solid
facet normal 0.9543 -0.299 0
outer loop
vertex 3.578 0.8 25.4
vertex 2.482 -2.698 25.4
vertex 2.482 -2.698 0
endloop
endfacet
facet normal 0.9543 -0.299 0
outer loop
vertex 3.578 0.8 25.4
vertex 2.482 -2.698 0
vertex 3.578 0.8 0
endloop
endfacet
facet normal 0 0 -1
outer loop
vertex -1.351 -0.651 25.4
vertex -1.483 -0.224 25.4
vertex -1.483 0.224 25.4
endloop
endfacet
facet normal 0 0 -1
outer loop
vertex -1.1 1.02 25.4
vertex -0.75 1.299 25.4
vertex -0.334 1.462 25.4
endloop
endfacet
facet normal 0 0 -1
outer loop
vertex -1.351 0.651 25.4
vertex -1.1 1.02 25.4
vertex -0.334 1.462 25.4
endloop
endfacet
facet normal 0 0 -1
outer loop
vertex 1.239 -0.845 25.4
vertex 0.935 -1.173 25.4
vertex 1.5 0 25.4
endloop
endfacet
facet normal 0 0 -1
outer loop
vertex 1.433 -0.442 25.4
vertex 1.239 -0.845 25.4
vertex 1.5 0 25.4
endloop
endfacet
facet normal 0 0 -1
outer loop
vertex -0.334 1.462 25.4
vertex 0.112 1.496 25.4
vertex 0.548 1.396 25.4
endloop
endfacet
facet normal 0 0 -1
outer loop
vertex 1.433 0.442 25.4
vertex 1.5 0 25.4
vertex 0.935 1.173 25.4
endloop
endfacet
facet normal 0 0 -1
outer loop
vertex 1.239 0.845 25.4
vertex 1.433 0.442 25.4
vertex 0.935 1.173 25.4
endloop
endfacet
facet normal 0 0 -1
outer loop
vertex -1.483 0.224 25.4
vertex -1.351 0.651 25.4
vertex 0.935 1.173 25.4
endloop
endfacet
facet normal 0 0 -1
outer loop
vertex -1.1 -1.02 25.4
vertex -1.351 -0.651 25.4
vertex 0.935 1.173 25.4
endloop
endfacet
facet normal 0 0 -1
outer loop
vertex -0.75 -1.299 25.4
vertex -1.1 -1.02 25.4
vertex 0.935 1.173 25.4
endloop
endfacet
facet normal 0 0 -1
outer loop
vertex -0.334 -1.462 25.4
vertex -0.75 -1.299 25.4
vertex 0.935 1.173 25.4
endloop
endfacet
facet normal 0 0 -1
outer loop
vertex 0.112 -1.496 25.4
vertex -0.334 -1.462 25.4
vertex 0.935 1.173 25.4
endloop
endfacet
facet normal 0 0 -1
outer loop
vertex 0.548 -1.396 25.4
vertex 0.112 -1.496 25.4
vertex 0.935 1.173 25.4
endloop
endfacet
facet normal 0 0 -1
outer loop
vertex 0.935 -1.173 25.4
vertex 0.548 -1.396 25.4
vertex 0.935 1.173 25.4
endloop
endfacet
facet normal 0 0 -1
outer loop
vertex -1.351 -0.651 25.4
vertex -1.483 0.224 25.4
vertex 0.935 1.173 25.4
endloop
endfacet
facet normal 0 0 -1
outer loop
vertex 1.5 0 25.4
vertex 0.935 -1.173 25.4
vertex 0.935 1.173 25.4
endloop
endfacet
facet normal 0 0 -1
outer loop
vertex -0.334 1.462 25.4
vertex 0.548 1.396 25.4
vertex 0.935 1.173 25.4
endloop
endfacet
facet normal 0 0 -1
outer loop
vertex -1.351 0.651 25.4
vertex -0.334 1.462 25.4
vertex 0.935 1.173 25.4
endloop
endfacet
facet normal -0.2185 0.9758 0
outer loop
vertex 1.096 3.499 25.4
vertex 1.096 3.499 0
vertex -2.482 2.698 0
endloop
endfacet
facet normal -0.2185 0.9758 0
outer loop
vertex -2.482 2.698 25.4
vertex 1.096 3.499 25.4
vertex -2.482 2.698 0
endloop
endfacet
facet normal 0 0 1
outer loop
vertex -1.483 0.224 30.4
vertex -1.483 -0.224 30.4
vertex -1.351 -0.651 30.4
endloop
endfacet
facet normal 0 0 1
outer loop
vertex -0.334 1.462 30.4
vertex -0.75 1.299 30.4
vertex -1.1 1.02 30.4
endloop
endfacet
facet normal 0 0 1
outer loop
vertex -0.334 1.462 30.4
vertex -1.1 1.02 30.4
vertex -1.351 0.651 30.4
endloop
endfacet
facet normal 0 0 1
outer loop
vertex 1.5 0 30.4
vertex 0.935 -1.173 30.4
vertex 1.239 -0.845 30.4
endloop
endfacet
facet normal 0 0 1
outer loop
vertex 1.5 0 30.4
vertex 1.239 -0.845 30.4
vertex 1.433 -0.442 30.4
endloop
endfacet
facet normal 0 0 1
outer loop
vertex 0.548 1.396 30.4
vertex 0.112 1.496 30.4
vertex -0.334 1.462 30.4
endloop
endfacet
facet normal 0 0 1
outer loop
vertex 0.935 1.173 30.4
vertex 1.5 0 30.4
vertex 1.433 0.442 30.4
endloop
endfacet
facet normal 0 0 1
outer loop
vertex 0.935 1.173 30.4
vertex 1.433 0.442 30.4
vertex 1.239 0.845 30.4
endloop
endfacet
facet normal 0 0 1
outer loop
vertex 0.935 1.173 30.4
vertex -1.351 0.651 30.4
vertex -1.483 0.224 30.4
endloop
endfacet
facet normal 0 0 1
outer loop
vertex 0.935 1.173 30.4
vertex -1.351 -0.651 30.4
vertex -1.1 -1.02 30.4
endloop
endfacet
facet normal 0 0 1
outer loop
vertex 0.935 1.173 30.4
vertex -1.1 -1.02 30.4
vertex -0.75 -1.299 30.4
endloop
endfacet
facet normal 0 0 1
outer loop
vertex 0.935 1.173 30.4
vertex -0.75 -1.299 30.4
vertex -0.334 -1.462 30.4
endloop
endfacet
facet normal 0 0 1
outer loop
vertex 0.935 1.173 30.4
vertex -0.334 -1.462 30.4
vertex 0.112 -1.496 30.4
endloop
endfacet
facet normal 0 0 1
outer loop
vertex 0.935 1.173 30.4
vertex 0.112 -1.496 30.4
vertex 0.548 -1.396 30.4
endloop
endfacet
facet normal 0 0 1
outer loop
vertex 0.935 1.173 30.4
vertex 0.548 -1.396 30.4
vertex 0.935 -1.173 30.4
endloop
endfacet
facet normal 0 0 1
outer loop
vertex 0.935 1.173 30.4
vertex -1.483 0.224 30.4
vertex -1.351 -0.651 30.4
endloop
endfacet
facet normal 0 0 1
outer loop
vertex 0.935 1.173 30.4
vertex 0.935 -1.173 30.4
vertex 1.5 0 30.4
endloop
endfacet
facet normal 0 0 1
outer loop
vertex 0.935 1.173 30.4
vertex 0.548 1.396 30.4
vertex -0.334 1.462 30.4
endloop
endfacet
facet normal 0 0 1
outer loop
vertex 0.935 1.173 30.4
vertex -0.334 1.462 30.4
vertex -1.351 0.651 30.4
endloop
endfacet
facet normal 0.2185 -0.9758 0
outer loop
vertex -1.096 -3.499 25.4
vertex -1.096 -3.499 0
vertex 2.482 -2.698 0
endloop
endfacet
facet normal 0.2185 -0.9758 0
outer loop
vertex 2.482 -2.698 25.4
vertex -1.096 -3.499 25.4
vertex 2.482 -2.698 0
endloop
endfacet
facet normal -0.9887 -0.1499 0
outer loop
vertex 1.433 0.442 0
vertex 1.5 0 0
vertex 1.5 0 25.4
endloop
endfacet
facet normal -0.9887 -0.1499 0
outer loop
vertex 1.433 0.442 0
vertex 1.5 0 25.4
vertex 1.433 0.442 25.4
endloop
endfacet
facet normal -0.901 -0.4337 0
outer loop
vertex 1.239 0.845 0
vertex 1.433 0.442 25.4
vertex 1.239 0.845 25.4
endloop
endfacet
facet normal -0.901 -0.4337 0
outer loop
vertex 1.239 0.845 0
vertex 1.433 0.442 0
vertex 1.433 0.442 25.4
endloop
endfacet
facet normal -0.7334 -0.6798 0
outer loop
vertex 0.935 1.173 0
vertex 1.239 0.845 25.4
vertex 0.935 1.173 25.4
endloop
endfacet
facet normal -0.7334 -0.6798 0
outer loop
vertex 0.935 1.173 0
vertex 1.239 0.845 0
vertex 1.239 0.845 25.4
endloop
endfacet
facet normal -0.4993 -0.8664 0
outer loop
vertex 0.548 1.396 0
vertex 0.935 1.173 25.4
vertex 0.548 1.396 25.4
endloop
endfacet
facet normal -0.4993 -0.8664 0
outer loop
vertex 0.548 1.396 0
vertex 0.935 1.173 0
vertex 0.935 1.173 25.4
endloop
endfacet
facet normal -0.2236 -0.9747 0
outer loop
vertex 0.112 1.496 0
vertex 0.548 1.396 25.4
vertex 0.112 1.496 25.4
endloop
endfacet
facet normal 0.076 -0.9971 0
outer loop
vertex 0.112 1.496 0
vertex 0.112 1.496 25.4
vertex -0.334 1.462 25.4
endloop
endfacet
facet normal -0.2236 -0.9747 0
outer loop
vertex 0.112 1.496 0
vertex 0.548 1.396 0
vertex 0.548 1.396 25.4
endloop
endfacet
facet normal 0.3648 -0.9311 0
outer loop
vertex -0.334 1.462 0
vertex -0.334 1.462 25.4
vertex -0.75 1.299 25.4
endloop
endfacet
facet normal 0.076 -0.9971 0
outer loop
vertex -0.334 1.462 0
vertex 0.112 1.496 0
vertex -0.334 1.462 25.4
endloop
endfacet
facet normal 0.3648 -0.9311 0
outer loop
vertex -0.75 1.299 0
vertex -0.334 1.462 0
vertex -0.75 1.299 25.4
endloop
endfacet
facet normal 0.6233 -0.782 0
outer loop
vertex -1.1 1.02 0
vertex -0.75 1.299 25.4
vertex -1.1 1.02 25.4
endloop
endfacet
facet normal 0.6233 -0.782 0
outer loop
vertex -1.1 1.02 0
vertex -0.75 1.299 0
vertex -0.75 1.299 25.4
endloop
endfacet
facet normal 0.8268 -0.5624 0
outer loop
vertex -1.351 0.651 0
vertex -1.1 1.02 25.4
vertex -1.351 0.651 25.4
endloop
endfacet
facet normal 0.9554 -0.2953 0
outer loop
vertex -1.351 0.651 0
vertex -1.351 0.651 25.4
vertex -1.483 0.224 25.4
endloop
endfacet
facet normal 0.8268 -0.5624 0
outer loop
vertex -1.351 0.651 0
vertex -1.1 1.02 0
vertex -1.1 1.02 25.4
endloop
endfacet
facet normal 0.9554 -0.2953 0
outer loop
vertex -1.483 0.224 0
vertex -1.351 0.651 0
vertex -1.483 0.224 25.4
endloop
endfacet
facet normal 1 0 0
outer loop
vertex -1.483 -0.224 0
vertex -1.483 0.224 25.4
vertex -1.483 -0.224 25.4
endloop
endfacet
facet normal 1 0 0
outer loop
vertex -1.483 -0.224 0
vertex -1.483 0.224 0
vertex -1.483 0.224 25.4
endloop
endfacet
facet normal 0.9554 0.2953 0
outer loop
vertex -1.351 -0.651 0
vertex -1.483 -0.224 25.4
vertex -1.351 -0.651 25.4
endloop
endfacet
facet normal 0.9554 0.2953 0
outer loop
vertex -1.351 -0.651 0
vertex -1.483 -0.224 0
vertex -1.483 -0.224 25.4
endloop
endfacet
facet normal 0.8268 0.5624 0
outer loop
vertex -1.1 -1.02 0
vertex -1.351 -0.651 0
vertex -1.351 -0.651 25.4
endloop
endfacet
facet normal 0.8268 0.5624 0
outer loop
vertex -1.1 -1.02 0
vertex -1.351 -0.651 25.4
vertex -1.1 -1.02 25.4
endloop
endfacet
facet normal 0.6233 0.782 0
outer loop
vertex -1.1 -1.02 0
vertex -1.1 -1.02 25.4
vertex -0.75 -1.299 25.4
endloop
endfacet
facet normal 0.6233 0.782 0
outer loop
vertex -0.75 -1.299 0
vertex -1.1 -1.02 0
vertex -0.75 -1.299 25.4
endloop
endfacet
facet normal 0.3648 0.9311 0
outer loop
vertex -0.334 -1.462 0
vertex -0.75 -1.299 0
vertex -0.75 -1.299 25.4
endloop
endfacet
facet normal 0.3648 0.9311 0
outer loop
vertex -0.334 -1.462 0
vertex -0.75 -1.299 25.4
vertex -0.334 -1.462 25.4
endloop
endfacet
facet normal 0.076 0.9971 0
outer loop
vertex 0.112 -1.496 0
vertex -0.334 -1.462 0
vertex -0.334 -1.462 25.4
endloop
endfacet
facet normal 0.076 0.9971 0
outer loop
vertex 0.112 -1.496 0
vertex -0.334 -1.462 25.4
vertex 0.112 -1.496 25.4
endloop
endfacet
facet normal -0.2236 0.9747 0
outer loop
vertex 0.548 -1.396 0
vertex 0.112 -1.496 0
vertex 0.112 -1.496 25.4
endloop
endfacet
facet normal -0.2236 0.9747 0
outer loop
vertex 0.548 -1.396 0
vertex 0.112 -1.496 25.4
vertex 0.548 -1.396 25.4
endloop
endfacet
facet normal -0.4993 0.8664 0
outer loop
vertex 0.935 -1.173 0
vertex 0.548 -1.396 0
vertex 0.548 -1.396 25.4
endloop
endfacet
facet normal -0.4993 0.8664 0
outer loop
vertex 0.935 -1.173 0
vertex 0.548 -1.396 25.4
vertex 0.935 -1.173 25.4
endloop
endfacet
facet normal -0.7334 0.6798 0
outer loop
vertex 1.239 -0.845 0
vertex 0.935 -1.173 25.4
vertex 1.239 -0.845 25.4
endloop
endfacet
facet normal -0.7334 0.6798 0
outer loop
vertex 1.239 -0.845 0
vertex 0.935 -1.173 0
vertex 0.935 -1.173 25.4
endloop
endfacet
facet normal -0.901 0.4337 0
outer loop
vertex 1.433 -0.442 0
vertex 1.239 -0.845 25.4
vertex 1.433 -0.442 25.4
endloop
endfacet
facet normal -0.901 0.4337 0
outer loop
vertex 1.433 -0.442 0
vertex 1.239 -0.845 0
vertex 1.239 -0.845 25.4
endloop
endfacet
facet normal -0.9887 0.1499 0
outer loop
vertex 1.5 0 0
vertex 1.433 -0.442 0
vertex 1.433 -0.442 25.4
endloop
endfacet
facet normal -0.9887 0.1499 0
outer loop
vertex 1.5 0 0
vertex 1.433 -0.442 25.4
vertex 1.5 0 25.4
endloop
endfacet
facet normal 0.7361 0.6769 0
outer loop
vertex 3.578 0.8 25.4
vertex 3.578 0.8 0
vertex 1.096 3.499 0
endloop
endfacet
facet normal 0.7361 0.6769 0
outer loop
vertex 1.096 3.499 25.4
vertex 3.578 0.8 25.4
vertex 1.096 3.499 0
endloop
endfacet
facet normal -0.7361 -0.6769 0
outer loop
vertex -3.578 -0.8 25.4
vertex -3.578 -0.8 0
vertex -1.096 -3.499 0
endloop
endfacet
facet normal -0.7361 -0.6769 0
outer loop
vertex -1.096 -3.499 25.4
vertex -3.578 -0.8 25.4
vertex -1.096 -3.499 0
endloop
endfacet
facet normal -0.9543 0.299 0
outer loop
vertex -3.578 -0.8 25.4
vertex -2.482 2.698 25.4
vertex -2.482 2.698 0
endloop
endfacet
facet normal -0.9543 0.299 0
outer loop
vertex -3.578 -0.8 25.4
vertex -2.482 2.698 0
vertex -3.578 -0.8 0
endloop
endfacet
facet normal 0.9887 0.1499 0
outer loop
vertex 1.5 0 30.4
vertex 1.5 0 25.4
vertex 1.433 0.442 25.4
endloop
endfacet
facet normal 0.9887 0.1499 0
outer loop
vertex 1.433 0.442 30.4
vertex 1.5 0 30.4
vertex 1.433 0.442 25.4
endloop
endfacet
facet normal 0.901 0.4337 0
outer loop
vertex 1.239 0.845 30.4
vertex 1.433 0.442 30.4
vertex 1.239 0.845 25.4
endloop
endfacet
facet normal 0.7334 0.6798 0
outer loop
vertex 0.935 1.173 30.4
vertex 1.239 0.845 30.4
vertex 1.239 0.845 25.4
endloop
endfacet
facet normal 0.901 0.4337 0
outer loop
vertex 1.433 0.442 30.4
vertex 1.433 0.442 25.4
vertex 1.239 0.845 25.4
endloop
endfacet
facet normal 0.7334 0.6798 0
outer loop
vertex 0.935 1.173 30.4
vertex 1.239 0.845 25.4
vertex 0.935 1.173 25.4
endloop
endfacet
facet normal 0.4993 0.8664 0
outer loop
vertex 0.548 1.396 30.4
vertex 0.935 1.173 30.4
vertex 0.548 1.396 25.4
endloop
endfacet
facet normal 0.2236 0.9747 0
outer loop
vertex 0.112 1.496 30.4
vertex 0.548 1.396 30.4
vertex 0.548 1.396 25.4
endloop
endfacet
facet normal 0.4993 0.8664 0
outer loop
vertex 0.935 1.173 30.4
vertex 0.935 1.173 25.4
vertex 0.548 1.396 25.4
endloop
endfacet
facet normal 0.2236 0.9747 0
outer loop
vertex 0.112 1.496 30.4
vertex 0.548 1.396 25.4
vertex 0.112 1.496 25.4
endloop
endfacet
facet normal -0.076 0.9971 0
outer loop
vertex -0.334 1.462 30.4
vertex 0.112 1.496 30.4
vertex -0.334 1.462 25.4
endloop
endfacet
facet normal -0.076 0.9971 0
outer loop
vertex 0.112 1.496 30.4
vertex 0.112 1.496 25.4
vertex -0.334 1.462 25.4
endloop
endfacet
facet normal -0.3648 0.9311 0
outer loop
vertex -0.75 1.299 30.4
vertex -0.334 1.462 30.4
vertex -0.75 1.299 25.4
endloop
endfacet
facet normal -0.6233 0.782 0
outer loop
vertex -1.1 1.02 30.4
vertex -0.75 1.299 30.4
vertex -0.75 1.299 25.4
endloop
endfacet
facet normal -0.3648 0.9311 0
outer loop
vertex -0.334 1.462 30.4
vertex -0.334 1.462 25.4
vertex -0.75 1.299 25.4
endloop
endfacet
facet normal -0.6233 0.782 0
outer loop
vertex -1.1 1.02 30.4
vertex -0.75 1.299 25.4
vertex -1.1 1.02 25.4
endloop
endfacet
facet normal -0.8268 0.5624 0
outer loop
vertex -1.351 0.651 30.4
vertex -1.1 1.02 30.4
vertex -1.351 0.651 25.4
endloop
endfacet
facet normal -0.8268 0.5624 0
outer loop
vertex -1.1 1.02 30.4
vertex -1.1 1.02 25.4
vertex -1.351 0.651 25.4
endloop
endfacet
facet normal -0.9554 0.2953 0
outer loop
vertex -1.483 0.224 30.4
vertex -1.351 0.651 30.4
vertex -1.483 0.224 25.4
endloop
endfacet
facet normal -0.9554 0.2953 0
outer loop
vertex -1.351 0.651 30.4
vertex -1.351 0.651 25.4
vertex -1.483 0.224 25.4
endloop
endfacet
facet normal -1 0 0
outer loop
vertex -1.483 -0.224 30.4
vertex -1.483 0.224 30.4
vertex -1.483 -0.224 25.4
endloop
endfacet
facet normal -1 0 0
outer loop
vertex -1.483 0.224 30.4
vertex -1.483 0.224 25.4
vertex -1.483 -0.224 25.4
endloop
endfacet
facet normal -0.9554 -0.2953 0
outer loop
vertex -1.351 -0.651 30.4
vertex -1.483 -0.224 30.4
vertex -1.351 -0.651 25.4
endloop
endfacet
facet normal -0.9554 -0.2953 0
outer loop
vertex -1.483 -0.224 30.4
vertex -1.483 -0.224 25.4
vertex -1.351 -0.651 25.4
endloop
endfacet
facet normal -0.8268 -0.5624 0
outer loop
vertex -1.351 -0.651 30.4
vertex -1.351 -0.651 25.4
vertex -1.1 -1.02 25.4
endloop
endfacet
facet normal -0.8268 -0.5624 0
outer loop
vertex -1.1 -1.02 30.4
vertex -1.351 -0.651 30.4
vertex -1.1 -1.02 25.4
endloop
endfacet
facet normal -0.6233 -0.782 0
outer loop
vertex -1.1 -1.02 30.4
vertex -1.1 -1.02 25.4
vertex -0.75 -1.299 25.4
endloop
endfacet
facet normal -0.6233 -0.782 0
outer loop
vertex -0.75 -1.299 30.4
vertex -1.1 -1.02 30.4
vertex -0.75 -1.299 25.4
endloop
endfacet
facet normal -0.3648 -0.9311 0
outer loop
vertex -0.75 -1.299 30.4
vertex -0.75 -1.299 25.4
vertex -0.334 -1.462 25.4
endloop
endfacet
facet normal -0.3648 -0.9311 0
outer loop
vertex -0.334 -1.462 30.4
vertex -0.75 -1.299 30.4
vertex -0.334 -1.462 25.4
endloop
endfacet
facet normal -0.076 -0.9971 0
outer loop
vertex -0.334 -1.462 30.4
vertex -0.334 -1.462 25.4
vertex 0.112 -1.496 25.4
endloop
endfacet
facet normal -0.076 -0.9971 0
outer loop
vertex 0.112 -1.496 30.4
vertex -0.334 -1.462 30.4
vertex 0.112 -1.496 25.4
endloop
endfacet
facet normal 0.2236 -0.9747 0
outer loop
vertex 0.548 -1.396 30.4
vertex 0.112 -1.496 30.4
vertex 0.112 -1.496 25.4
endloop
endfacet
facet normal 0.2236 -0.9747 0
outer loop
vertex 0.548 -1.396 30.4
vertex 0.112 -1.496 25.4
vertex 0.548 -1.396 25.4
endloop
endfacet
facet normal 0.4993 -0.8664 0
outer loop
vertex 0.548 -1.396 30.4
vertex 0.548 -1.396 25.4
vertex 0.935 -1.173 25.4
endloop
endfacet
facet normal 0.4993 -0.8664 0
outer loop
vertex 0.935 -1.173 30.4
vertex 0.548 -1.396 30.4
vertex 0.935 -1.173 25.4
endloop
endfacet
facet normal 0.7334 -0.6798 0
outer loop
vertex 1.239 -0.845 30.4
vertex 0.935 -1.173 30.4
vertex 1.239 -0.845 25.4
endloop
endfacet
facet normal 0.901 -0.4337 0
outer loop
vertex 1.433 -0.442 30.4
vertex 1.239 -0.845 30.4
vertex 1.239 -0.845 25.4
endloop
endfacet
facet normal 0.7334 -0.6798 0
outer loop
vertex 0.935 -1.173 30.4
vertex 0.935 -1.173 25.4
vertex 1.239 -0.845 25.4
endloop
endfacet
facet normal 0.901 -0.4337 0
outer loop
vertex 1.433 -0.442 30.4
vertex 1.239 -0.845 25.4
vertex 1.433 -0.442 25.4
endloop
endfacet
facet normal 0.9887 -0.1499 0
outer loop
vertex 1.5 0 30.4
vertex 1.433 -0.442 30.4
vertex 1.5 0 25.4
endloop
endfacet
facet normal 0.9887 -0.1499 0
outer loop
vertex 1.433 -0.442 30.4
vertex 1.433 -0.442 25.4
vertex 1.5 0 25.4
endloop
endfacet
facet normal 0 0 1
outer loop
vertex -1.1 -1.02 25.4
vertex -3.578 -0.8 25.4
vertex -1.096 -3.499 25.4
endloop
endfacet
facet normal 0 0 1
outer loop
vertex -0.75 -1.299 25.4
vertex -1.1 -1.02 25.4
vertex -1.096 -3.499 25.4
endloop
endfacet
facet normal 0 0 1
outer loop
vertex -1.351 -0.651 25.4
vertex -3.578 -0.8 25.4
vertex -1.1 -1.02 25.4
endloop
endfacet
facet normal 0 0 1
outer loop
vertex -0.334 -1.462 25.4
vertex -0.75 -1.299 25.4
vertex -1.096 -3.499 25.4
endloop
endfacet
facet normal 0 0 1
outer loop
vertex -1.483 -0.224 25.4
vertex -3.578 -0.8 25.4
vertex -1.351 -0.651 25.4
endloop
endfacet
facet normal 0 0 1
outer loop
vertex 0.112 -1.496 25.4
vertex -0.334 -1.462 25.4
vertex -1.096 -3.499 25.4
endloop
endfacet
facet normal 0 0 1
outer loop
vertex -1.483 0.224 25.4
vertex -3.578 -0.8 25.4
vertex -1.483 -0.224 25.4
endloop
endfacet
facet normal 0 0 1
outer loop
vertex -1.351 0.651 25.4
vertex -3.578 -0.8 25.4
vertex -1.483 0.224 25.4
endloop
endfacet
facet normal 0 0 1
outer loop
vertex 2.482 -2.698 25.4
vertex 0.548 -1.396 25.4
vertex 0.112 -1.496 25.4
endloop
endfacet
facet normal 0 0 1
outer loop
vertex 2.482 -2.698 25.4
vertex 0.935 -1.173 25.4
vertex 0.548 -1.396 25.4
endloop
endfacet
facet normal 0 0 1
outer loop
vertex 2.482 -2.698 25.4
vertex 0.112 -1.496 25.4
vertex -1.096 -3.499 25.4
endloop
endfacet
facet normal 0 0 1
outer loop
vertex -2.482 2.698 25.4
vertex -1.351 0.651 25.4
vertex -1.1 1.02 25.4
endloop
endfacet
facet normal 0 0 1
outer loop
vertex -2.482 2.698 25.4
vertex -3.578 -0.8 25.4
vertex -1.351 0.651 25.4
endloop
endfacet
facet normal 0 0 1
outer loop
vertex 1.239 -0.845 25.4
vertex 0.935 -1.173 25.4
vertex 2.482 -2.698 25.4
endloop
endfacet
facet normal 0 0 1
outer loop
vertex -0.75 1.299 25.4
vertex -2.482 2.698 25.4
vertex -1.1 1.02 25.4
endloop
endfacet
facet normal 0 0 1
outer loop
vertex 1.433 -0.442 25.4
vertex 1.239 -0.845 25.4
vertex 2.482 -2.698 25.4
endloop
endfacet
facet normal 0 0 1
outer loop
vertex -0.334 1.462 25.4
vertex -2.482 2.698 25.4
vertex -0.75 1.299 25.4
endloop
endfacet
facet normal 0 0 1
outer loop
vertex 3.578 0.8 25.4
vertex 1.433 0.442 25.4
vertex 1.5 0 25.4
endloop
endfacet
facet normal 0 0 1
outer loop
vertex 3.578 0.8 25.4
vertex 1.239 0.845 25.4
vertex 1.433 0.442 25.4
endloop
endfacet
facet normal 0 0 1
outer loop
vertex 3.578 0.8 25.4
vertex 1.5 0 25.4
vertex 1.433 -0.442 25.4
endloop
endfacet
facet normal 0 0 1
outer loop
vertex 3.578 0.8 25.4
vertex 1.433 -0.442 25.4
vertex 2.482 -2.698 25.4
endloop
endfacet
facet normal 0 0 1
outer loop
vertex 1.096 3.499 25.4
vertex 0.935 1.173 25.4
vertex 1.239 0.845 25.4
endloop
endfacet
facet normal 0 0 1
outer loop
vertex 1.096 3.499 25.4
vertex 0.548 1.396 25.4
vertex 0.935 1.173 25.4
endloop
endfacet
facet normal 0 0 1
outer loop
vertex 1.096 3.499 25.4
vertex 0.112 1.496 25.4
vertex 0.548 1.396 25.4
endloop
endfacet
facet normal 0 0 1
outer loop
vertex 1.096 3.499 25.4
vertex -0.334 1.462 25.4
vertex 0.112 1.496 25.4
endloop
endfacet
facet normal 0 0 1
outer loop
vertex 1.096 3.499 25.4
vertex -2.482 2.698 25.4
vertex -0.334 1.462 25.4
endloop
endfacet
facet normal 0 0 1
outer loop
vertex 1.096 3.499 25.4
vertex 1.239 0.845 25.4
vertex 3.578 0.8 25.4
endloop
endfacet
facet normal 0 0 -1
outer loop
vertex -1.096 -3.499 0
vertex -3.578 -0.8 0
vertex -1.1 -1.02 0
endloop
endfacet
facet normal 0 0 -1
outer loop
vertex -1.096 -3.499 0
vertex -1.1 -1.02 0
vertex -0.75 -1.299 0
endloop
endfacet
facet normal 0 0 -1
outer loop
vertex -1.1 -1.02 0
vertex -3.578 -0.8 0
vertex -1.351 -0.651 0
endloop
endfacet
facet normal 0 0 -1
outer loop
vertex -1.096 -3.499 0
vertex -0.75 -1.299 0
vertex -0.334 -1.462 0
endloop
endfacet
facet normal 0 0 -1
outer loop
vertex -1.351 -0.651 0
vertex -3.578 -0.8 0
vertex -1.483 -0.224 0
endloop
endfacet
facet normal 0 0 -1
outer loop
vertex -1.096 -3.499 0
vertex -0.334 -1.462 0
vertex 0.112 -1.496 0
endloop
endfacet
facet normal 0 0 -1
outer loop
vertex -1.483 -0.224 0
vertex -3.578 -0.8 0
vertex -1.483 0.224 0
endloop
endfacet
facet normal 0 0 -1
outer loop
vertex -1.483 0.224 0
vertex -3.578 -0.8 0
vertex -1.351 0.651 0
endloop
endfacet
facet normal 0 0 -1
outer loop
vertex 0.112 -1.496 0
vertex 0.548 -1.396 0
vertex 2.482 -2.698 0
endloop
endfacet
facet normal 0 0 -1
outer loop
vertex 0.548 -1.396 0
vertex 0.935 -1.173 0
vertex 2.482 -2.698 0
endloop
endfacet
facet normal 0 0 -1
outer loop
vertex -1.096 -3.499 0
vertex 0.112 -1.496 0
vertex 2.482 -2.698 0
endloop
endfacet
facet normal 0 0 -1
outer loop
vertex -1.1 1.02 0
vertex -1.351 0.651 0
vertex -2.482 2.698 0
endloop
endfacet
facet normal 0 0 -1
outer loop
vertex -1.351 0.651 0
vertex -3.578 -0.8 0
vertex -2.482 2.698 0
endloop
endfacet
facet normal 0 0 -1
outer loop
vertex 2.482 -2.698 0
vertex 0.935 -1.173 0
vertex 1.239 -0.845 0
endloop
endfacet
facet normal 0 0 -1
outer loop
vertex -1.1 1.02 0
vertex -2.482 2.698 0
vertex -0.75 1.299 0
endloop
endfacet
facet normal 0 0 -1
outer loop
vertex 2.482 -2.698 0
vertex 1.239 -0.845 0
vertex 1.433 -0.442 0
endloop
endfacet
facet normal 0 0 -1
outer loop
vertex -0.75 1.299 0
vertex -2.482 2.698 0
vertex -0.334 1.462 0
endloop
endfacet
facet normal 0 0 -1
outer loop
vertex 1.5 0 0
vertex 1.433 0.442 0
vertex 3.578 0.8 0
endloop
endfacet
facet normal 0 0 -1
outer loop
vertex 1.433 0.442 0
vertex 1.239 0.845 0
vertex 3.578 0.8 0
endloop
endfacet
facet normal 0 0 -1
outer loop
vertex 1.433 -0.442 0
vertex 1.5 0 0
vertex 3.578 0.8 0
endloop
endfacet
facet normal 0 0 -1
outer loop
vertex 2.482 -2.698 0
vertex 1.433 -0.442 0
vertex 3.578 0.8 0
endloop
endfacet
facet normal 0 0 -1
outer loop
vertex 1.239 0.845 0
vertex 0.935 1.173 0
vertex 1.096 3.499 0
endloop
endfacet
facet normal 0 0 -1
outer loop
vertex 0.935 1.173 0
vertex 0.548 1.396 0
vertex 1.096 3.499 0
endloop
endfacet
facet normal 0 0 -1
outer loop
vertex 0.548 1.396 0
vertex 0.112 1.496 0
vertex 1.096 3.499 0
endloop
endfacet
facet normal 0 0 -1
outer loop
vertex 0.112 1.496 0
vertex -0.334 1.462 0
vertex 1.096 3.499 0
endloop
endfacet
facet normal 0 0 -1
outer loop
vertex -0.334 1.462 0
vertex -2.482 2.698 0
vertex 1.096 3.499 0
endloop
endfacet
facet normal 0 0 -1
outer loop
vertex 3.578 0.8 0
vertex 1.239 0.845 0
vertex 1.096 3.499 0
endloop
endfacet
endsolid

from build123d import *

# Parameters (mm, degrees)
SKETCH1_R           = 1.5
BOSS_EXTRUDE1_DEPTH = 25.4
SKETCH2_R           = 1.5
BOSS_EXTRUDE2_DEPTH = 5


with BuildPart() as part:
    # Sketch1 → Boss-Extrude1 (new body)
    with BuildSketch(Plane.XY):
        Polygon((2.482034315, -2.698210331), (3.577735849, 0.800399604), (1.095701534, 3.498609936), (-2.482034315, 2.698210331), (-3.577735849, -0.800399604), (-1.095701534, -3.498609936), align=None)
        Circle(SKETCH1_R, mode=Mode.SUBTRACT)
    extrude(amount=BOSS_EXTRUDE1_DEPTH)


with BuildPart() as body_2:
    # Sketch2 → Boss-Extrude2 (new body)
    with BuildSketch(Plane.XY.offset(25.4)):
        Circle(SKETCH2_R)
    extrude(amount=BOSS_EXTRUDE2_DEPTH)


solid = Compound([part.part, body_2.part])
